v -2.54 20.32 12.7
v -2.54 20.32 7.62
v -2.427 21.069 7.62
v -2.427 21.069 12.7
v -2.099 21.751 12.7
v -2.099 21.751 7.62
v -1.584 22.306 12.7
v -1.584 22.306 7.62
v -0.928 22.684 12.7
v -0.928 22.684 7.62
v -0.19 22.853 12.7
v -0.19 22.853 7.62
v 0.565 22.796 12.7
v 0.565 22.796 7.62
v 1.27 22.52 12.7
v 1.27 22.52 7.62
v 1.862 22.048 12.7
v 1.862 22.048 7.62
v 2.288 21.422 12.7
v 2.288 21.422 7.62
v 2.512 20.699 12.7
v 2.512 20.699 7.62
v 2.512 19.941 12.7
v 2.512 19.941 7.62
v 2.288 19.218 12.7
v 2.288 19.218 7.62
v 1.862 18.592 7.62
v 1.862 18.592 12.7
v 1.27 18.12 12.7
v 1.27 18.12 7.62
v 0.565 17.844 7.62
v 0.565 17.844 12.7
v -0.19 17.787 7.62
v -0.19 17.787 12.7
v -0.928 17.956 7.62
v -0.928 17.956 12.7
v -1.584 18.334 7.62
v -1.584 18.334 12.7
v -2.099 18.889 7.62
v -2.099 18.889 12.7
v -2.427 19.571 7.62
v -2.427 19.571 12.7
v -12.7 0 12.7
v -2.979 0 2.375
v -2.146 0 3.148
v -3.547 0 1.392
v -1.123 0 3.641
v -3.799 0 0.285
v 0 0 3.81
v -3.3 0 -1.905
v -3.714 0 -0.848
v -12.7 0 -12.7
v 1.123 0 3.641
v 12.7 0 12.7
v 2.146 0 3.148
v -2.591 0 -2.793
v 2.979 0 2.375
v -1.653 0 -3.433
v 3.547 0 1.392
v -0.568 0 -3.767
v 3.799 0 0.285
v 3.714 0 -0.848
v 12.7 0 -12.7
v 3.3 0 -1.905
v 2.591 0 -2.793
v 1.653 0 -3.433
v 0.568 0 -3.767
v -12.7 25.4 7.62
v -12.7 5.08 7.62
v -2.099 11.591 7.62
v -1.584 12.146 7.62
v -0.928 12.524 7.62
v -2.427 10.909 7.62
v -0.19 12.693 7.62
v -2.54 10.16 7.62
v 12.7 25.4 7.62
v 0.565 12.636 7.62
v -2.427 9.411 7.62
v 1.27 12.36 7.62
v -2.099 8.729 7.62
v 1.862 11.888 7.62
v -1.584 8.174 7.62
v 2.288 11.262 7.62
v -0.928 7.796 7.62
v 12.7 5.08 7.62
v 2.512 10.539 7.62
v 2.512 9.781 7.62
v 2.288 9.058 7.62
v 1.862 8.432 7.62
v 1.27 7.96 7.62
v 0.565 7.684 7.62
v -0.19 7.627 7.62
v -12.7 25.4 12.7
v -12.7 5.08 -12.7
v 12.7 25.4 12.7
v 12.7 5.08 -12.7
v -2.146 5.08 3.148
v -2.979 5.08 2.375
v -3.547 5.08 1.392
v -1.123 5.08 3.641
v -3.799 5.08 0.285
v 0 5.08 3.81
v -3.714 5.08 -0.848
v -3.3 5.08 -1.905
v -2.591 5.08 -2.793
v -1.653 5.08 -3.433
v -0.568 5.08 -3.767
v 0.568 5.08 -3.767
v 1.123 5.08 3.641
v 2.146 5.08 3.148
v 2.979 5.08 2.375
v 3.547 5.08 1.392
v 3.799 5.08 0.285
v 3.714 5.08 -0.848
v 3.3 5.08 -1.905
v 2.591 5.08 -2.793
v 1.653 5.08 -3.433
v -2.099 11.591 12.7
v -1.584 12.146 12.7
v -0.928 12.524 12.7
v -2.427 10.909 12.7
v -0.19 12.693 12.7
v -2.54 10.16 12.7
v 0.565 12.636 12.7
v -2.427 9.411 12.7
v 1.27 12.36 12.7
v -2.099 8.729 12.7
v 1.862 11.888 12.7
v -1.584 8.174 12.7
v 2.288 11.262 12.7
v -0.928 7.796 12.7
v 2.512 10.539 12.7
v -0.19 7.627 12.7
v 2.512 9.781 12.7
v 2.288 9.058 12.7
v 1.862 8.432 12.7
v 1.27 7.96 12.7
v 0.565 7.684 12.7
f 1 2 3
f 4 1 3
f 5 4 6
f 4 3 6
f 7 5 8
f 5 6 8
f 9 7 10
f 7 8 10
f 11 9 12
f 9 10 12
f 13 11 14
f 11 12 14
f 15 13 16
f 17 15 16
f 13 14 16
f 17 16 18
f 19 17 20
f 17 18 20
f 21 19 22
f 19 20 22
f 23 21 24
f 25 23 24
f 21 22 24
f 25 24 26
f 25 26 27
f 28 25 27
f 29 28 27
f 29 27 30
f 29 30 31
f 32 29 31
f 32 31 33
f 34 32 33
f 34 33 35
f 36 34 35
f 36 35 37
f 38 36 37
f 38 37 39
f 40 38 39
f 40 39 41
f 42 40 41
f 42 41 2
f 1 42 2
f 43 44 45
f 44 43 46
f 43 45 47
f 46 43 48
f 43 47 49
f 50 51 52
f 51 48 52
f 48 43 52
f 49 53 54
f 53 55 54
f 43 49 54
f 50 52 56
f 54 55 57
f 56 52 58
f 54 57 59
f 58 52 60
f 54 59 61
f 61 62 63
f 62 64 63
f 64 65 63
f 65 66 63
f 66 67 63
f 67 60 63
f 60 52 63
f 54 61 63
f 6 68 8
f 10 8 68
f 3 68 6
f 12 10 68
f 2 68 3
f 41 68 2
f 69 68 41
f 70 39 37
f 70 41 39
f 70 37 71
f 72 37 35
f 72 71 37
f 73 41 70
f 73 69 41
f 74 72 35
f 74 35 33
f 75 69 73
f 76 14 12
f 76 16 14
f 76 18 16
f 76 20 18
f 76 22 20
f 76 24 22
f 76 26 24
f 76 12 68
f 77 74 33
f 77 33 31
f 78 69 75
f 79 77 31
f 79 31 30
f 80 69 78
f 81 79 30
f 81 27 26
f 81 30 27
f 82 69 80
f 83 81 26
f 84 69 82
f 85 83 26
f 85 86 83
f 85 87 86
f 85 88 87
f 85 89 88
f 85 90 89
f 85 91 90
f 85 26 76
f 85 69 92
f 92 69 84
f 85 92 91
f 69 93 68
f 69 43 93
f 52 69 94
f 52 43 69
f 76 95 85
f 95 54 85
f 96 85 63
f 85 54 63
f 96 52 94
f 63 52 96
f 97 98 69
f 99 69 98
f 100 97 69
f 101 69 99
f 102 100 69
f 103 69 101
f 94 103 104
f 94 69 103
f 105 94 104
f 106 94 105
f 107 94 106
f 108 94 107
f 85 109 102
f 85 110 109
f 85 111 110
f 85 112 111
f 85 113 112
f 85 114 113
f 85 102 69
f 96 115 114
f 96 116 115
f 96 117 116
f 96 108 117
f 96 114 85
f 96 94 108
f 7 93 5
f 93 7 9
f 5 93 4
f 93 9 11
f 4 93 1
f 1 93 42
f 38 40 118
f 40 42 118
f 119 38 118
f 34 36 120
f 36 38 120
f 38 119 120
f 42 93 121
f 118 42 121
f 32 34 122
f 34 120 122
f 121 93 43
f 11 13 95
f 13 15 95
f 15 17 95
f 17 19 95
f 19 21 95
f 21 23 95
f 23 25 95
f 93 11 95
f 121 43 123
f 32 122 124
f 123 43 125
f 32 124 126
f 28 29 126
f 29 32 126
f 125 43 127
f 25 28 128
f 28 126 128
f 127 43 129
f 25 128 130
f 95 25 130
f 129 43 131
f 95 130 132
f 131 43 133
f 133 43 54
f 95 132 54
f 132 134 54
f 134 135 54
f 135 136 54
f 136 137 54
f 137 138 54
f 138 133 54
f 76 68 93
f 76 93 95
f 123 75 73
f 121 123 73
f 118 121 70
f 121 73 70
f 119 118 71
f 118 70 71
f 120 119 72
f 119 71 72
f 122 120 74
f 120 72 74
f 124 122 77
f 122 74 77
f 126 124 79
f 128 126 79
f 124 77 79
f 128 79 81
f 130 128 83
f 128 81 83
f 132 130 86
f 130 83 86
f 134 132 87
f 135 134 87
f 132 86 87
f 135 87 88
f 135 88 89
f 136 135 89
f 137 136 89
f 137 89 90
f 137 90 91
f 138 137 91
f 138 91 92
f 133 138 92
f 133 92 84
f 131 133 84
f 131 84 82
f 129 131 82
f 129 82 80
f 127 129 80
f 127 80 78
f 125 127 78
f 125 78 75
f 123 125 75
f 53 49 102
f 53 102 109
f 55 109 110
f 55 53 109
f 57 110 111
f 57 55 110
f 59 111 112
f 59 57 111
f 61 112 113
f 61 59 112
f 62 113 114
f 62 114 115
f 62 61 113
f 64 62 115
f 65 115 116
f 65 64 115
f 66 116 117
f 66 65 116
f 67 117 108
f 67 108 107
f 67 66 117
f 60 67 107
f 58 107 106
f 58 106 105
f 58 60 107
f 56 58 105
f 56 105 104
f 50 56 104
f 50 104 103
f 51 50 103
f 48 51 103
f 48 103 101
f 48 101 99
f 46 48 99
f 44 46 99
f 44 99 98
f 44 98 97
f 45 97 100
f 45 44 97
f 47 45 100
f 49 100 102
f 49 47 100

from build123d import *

# Parameters (mm, degrees)
SKETCH2_W           = 25.4
SKETCH2_H           = 25.4
SKETCH2_R           = 3.81
BOSS_EXTRUDE1_DEPTH = 5.08
SKETCH3_W           = 25.4
SKETCH3_H           = 5.08
BOSS_EXTRUDE2_DEPTH = 20.32
SKETCH4_R           = 2.54
CUT_EXTRUDE1_DEPTH  = 35.919226796


with BuildPart() as part:
    # Sketch2 → Boss-Extrude1 (new body)
    with BuildSketch(Plane(origin=(0, 0, 0), x_dir=(1, 0, 0), z_dir=(0, 1, 0))):
        Rectangle(SKETCH2_W, SKETCH2_H)
        with Locations(Location((0, 0, 0), (0, 0, 270))):
            Circle(SKETCH2_R, mode=Mode.SUBTRACT)
    extrude(amount=BOSS_EXTRUDE1_DEPTH)

    # Sketch3 → Boss-Extrude2 (add)
    with BuildSketch(Plane(origin=(0, 5.08, 0), x_dir=(1, 0, 0), z_dir=(0, 1, 0))):
        with Locations((0, -10.16)):
            Rectangle(SKETCH3_W, SKETCH3_H)
    extrude(amount=BOSS_EXTRUDE2_DEPTH)

    # Sketch4 → Cut-Extrude1 (cut, through all)
    with BuildSketch(Plane(origin=(0, 0, 7.62), x_dir=(-1, 0, 0), z_dir=(0, 0, -1))):
        with Locations((0, 20.32)):
            Circle(SKETCH4_R)
        with Locations((0, 10.16)):
            Circle(SKETCH4_R)
    extrude(amount=-CUT_EXTRUDE1_DEPTH, mode=Mode.SUBTRACT)


solid = part.part
